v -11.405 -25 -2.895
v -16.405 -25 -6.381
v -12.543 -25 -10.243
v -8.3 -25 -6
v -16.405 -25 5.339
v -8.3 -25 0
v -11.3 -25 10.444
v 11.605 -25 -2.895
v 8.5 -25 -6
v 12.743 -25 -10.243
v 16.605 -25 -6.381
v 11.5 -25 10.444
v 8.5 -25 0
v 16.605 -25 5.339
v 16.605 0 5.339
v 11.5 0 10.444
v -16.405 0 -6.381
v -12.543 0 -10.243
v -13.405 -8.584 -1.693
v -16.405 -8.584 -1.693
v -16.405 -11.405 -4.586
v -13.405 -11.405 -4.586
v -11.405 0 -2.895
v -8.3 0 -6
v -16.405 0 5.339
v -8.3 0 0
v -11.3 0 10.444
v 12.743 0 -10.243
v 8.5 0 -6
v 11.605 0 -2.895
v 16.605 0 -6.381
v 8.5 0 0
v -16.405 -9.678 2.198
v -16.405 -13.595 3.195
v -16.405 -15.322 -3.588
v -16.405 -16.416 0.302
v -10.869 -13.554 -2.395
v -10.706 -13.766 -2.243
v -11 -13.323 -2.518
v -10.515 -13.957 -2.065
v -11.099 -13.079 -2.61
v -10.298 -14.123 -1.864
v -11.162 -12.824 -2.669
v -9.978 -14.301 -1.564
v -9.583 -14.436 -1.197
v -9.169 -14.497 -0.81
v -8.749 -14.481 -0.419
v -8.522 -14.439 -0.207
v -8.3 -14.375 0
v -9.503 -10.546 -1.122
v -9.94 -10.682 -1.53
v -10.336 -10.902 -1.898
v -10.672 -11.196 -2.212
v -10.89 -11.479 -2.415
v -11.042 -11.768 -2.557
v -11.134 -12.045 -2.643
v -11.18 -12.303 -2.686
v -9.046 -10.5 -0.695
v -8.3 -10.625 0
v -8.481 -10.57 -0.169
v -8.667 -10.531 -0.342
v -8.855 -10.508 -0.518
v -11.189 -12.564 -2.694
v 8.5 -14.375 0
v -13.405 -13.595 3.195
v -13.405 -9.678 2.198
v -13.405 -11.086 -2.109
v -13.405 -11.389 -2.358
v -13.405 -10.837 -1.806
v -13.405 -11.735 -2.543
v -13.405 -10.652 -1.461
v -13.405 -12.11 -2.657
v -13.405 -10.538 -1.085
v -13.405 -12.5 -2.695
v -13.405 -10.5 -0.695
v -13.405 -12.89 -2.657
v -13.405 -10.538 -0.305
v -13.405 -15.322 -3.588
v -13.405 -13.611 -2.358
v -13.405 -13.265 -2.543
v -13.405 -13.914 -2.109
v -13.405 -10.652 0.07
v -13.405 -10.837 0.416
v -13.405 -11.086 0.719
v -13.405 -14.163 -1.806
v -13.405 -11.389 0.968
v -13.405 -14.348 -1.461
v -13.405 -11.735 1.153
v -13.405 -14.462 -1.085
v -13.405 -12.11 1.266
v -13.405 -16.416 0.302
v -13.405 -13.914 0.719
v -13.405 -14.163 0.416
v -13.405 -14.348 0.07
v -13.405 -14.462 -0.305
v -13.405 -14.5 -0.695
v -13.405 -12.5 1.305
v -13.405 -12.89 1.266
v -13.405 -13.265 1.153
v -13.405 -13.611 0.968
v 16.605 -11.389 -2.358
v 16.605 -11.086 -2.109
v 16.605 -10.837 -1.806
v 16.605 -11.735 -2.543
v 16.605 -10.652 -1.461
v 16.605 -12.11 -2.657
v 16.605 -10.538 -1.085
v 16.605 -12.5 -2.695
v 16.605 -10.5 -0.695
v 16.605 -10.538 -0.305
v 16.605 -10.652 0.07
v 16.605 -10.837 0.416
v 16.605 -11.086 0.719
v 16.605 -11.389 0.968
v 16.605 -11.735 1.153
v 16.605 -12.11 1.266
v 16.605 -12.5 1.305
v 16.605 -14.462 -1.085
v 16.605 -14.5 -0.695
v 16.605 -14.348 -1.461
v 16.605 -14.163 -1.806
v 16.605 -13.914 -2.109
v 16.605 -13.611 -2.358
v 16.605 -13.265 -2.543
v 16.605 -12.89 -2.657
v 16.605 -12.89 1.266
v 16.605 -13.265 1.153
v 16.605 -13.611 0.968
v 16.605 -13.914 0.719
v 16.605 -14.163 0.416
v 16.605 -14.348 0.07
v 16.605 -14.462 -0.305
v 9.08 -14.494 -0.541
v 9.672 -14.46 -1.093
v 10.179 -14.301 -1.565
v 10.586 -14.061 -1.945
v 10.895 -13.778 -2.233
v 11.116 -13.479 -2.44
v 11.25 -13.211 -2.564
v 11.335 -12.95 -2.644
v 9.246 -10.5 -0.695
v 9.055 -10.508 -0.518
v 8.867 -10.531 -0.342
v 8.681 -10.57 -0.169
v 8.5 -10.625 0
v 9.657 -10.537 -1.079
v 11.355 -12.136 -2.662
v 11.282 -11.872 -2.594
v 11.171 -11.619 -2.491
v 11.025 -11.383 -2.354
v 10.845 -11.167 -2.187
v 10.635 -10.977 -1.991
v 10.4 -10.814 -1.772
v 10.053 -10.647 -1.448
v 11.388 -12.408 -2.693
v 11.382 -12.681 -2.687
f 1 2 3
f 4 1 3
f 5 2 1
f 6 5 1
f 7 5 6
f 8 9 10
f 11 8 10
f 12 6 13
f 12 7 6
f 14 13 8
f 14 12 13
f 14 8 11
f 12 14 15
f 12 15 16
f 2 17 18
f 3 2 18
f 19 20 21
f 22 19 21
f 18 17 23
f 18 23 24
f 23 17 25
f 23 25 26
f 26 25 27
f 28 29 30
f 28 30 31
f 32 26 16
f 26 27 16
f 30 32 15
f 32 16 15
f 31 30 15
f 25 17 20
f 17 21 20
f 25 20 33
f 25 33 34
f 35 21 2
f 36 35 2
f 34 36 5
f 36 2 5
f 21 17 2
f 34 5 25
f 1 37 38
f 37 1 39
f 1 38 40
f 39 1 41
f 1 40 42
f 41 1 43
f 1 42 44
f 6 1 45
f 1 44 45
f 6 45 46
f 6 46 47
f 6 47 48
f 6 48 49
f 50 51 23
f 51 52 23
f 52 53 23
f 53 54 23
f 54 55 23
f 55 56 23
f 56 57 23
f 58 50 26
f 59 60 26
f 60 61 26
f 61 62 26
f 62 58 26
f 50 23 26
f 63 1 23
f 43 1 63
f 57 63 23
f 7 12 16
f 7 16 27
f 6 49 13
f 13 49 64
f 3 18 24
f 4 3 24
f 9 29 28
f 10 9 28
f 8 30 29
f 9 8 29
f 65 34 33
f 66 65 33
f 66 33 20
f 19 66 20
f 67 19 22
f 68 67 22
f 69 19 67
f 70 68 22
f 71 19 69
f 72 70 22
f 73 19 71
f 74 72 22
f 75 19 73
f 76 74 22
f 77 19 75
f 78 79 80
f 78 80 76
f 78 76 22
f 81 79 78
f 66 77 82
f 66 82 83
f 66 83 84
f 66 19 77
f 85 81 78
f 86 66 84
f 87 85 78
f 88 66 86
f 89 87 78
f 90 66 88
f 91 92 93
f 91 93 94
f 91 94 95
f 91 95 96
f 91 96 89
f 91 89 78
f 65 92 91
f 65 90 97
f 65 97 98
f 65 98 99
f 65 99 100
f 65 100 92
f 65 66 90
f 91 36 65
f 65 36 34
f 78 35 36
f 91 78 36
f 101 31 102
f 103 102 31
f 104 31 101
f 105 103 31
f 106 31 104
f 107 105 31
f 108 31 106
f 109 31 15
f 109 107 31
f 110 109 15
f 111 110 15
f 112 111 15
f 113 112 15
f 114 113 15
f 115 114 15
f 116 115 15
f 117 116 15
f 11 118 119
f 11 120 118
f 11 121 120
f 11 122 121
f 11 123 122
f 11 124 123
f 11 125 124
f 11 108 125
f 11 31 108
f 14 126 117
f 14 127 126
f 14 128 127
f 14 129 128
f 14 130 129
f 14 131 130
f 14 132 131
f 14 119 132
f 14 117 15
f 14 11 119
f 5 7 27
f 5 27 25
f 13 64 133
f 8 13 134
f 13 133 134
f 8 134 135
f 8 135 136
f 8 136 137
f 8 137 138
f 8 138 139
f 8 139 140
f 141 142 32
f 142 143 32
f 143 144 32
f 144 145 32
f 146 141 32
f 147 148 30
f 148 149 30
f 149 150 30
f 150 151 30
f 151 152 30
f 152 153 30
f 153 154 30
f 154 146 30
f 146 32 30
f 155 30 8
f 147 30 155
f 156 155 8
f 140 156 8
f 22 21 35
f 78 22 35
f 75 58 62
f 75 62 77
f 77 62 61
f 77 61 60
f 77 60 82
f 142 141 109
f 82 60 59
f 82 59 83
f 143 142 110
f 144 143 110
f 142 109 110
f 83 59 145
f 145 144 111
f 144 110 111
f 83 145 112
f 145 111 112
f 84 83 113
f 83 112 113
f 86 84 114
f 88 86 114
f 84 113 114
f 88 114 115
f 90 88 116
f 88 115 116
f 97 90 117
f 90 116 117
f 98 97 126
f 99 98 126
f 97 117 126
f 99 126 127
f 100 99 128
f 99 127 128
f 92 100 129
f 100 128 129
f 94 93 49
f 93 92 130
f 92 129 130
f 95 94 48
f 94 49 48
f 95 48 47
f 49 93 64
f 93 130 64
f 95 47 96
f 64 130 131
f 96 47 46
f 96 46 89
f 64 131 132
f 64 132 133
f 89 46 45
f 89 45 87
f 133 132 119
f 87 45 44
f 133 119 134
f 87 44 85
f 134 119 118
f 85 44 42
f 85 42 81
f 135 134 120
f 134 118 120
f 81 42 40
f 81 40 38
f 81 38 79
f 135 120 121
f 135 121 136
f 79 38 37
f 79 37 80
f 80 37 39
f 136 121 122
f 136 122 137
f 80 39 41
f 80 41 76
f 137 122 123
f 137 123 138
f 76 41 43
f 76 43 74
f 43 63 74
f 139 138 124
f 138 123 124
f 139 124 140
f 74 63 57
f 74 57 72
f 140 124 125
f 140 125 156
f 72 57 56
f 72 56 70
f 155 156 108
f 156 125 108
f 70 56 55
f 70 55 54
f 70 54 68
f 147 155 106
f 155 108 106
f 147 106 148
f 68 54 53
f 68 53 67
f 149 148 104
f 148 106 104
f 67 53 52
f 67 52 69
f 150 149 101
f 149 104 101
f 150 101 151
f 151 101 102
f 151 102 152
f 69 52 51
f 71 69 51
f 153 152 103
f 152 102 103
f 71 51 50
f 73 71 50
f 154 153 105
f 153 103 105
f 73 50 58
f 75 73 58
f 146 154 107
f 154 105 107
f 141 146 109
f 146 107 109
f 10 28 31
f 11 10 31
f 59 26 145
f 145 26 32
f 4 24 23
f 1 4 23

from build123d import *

# Parameters (mm, degrees)
F1_DEPTH = 25
F2_W     = 7.596032
F2_H     = 21.10009
F2_W_2   = 10.268714
F2_H_2   = 30.102797
F3_DEPTH = 25
F4_R     = 2
F5_DEPTH = 35
F7_DEPTH = 3


with BuildPart() as f1:
    # F0 (on Front) → F1 (new body)
    with BuildSketch(Plane.XZ):
        Polygon((-11.404762, -2.895238), (-8.3, 0), (8.5, 0), (11.604762, -2.895238), (8.5, -6), (12.742641, -10.242641), (22.464761, -0.520521), (11.5, 10.44424), (-11.3, 10.44424), (-22.264761, -0.520521), (-12.542641, -10.242641), (-8.3, -6), align=None)
    extrude(amount=F1_DEPTH)

    # F2 (on face) → F3 (cut)
    with BuildSketch(Plane.XZ.offset(25)):
        with Locations((-20.202778, -0.557668)):
            Rectangle(F2_W, F2_H)
        with Locations((21.739119, -1.542339)):
            Rectangle(F2_W_2, F2_H_2)
    extrude(amount=-F3_DEPTH, mode=Mode.SUBTRACT)

    # F4 (on face) → F5 (cut)
    with BuildSketch(Plane.YZ.offset(16.604762)):
        with Locations((-12.5, -0.695238)):
            Circle(F4_R)
    extrude(amount=-F5_DEPTH, mode=Mode.SUBTRACT)

    # F6 (on face) → F7 (cut)
    with BuildSketch(Plane(origin=(-16.404762, 0, 0), x_dir=(0, -1, 0), z_dir=(-1, 0, 0))):
        Polygon((15.321942, -3.588329), (16.416462, 0.30209), (13.59452, 3.195181), (9.678058, 2.197854), (8.583538, -1.692565), (11.40548, -4.585657), align=None)
    extrude(amount=-F7_DEPTH, mode=Mode.SUBTRACT)


solid = f1.part
